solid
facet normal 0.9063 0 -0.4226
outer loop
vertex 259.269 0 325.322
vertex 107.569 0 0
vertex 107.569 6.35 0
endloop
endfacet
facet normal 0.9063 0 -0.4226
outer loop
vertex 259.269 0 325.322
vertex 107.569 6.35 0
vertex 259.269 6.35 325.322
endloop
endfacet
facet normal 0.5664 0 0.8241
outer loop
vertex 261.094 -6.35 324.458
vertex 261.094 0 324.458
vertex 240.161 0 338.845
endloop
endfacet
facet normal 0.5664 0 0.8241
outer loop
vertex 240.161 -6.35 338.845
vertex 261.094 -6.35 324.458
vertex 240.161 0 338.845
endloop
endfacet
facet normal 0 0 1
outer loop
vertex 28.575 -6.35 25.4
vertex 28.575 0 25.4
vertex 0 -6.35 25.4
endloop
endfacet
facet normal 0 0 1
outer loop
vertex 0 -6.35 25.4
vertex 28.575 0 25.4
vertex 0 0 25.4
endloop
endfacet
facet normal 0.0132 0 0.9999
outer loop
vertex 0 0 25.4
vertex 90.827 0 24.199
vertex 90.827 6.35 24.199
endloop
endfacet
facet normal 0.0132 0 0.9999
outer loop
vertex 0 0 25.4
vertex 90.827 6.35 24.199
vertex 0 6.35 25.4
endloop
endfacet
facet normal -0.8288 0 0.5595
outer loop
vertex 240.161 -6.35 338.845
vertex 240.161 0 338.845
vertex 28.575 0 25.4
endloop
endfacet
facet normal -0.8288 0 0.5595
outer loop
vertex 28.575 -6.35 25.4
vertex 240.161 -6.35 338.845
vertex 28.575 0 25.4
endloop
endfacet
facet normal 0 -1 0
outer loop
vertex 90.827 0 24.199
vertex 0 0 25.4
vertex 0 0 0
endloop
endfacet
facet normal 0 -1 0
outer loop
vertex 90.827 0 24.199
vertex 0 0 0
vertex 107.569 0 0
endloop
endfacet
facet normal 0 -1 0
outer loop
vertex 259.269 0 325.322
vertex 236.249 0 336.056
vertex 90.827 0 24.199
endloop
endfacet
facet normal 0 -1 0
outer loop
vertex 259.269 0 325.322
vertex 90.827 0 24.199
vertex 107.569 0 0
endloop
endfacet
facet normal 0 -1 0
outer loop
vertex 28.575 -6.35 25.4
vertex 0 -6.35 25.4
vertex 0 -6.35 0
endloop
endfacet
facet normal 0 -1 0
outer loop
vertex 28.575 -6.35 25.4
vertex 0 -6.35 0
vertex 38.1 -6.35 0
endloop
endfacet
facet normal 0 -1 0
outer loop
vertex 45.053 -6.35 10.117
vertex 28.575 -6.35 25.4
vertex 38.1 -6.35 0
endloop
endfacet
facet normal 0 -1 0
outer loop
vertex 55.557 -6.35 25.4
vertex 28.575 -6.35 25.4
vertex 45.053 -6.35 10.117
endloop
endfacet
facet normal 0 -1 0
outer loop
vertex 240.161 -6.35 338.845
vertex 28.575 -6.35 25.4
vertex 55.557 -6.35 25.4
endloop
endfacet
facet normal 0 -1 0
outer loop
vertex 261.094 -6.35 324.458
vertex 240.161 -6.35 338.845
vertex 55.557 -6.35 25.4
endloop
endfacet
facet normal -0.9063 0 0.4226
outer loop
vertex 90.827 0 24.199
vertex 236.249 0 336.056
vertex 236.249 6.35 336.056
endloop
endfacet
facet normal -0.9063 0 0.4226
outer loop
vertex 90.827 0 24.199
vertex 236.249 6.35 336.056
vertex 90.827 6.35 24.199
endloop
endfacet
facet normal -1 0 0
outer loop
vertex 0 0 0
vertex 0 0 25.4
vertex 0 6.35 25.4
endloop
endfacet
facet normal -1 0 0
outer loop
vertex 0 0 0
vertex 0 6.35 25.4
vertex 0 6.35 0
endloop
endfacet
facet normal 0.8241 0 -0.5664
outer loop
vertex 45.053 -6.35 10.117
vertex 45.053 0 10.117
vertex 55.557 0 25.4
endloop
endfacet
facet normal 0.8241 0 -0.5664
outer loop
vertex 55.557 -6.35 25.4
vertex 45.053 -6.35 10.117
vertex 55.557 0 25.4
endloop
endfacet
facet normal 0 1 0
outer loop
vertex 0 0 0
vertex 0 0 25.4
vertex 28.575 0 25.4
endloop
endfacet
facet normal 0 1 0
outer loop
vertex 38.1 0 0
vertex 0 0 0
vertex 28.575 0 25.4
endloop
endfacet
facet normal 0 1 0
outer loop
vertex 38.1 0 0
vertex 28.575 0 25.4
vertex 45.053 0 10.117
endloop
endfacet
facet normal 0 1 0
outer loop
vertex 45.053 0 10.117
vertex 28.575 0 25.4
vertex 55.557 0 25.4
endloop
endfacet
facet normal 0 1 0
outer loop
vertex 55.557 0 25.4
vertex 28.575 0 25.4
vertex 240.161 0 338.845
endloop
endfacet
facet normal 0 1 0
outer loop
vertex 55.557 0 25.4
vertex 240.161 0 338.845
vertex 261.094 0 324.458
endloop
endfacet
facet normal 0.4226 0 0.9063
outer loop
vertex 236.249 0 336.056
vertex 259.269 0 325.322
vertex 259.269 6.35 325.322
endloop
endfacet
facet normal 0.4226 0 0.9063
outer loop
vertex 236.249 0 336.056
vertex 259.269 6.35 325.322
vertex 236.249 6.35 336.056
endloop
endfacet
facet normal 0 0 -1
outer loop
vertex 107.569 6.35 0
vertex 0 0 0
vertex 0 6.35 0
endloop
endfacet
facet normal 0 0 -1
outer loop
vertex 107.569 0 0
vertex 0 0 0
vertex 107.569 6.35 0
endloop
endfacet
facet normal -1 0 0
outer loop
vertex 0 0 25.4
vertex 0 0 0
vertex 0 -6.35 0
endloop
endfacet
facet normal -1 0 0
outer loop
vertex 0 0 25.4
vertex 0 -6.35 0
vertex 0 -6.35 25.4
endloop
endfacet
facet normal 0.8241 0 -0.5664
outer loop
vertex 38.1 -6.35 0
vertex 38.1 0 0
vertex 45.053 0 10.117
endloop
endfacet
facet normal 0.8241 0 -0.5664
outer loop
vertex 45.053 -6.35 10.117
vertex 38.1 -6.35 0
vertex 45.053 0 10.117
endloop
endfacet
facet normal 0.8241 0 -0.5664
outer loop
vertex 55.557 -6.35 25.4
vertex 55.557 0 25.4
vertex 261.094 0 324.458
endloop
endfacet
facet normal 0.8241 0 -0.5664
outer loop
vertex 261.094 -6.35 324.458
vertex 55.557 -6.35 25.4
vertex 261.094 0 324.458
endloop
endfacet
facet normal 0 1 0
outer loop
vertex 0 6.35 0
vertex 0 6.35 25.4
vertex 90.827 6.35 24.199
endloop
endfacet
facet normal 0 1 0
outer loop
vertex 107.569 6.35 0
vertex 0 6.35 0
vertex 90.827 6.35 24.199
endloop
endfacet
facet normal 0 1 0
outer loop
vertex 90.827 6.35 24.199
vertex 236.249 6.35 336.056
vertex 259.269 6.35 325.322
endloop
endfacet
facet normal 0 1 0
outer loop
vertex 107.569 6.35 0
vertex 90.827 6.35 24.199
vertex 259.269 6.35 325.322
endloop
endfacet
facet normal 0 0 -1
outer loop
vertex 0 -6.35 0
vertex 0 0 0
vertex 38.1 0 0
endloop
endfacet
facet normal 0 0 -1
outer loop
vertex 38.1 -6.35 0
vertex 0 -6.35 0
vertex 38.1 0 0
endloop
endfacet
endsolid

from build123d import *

# Parameters (mm, degrees)
F0_W     = 28.575
F0_H     = 25.4
F1_DEPTH = 6.35
F3_DEPTH = 6.35


with BuildPart() as f1:
    # F0 (on Front) → F1 (new body)
    with BuildSketch(Plane.XZ):
        with Locations((14.2875, 12.7)):
            Rectangle(F0_W, F0_H)
        Polygon((28.575, 25.4), (28.575, 0), (38.1, 0), align=None)
        Polygon((28.575, 25.4), (38.1, 0), (45.053432, 10.117306), align=None)
        Polygon((55.556936, 25.4), (28.575, 25.4), (45.053432, 10.117306), align=None)
        Polygon((240.16133, 338.845199), (28.575, 25.4), (55.556936, 25.4), (261.094135, 324.45848), align=None)
    extrude(amount=F1_DEPTH)


with BuildPart() as f3:
    # F2 (on Front) → F3 (new body)
    with BuildSketch(Plane.XZ):
        Polygon((0, 25.4), (0, 0), (107.569, 0), (259.269008, 325.321718), (236.248791, 336.056222), (90.827313, 24.198856), align=None)
    extrude(amount=-F3_DEPTH)


solid = Compound([f1.part, f3.part])
